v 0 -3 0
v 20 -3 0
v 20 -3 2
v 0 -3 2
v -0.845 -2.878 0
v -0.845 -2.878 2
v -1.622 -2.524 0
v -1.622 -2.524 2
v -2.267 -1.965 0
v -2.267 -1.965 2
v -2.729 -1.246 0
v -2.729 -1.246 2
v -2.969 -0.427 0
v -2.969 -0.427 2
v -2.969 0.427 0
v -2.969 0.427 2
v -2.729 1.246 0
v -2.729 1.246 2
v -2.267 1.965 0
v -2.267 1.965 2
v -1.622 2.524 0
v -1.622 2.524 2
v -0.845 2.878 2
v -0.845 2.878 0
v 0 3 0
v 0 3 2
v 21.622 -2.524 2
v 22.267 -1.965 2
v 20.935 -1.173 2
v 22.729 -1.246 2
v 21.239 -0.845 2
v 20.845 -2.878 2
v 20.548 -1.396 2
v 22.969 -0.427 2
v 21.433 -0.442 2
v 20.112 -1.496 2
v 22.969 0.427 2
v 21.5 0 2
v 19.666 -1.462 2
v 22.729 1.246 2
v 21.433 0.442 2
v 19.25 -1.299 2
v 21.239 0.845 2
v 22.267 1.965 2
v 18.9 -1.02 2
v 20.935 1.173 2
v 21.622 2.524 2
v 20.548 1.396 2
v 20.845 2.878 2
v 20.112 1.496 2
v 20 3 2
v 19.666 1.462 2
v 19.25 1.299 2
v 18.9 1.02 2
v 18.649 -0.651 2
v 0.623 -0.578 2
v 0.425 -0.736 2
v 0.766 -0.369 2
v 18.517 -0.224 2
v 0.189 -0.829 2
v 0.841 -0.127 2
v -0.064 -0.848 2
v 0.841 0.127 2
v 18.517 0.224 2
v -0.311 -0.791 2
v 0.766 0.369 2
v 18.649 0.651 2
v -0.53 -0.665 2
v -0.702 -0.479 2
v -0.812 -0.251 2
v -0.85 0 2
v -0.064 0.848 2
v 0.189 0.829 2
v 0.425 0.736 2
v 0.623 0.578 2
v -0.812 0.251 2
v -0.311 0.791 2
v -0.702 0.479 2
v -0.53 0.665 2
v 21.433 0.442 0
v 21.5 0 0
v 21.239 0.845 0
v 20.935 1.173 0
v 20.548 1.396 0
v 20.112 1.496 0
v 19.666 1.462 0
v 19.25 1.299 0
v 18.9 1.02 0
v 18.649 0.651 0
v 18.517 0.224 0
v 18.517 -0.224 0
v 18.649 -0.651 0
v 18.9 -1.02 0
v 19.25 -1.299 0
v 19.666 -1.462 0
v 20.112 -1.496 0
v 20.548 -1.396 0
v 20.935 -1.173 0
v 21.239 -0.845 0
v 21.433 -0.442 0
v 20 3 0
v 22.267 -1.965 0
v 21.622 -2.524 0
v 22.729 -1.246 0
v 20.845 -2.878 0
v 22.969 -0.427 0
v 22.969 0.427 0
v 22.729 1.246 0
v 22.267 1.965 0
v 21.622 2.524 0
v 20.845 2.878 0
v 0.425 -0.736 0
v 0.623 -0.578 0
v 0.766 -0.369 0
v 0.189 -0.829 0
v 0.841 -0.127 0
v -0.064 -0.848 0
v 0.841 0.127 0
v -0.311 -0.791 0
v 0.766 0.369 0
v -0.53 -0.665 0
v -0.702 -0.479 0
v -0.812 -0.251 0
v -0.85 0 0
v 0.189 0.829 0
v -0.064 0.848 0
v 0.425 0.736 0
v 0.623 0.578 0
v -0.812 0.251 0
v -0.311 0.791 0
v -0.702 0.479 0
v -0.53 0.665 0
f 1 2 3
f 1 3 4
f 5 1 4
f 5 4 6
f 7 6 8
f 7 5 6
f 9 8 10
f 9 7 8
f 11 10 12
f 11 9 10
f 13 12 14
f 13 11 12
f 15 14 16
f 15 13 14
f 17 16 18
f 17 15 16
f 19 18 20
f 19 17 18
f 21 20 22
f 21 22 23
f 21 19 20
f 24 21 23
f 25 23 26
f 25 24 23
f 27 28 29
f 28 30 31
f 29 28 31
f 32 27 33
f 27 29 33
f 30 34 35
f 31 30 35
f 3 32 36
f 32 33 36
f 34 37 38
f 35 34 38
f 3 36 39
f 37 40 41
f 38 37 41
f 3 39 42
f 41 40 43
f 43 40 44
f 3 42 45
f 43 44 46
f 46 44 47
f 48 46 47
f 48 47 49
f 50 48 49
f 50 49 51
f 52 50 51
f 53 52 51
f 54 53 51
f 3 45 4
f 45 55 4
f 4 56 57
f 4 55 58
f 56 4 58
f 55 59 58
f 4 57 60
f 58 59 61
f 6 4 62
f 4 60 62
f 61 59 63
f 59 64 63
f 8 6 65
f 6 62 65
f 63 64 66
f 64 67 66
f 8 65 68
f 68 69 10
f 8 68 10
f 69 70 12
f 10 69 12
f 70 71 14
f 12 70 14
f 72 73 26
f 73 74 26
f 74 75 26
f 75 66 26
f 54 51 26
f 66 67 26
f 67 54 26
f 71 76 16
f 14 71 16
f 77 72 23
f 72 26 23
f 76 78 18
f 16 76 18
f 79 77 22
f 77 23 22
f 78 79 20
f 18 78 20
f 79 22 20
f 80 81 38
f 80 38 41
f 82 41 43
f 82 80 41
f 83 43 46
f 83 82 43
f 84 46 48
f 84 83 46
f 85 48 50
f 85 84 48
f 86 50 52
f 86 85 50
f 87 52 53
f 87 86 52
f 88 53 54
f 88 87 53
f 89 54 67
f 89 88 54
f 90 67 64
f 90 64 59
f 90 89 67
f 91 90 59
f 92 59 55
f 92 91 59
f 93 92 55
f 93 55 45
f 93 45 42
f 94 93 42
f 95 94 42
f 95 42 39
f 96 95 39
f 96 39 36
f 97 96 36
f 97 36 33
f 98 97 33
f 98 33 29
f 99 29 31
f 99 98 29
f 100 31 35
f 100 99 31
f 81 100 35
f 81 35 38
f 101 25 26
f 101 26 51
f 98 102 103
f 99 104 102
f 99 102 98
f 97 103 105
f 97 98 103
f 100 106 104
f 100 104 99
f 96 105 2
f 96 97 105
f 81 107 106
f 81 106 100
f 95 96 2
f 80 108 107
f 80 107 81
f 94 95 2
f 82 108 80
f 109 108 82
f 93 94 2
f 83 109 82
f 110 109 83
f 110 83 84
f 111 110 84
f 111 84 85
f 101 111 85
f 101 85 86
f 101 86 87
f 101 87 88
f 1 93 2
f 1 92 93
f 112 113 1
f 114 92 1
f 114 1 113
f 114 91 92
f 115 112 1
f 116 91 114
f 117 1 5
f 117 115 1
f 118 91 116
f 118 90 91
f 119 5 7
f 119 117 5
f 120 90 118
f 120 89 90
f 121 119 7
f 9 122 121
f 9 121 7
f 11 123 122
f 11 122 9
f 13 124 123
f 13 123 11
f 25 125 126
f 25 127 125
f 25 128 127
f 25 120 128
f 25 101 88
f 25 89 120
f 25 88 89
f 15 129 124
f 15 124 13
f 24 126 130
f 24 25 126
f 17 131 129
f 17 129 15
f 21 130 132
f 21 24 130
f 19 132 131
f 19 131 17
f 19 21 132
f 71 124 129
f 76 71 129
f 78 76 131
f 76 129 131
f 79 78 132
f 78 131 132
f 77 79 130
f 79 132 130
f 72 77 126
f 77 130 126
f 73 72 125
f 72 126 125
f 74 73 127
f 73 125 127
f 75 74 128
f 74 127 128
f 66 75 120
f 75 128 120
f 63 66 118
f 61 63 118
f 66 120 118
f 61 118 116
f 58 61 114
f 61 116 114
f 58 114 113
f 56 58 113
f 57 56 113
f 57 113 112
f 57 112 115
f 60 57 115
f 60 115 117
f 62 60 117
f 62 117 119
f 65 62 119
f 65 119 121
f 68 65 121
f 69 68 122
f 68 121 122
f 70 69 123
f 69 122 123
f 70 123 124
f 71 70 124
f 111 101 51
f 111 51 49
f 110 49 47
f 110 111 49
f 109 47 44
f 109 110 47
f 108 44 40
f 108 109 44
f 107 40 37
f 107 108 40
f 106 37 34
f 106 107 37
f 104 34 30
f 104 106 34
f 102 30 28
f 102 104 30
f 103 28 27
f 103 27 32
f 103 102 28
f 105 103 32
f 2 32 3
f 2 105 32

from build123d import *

# Parameters (mm, degrees)
SKETCH_1_R      = 1.5
EXTRUDE_1_DEPTH = 2
SKETCH_4_R      = 1.5
SKETCH_4_R_2    = 0.85
EXTRUDE_6_DEPTH = 2


with BuildPart() as part:
    # 草图1 → 凸台-拉伸1 (new body)
    with BuildSketch(Plane.XY):
        with BuildLine():
            Line((0, 3), (20, 3))
            ThreePointArc((20, 3), (23, 0), (20, -3))
            Line((20, -3), (0, -3))
            ThreePointArc((0, -3), (-3, 0), (0, 3))
        make_face()
        Circle(SKETCH_1_R, mode=Mode.SUBTRACT)
        with Locations((20, 0)):
            Circle(SKETCH_1_R, mode=Mode.SUBTRACT)
    extrude(amount=EXTRUDE_1_DEPTH)

    # 草图4 → 凸台-拉伸6 (add, through all)
    with BuildSketch(Plane(origin=(0, 0, 0), x_dir=(-1, 0, 0), z_dir=(0, 0, -1))):
        Circle(SKETCH_4_R)
        Circle(SKETCH_4_R_2, mode=Mode.SUBTRACT)
    extrude(amount=-EXTRUDE_6_DEPTH)


solid = part.part
